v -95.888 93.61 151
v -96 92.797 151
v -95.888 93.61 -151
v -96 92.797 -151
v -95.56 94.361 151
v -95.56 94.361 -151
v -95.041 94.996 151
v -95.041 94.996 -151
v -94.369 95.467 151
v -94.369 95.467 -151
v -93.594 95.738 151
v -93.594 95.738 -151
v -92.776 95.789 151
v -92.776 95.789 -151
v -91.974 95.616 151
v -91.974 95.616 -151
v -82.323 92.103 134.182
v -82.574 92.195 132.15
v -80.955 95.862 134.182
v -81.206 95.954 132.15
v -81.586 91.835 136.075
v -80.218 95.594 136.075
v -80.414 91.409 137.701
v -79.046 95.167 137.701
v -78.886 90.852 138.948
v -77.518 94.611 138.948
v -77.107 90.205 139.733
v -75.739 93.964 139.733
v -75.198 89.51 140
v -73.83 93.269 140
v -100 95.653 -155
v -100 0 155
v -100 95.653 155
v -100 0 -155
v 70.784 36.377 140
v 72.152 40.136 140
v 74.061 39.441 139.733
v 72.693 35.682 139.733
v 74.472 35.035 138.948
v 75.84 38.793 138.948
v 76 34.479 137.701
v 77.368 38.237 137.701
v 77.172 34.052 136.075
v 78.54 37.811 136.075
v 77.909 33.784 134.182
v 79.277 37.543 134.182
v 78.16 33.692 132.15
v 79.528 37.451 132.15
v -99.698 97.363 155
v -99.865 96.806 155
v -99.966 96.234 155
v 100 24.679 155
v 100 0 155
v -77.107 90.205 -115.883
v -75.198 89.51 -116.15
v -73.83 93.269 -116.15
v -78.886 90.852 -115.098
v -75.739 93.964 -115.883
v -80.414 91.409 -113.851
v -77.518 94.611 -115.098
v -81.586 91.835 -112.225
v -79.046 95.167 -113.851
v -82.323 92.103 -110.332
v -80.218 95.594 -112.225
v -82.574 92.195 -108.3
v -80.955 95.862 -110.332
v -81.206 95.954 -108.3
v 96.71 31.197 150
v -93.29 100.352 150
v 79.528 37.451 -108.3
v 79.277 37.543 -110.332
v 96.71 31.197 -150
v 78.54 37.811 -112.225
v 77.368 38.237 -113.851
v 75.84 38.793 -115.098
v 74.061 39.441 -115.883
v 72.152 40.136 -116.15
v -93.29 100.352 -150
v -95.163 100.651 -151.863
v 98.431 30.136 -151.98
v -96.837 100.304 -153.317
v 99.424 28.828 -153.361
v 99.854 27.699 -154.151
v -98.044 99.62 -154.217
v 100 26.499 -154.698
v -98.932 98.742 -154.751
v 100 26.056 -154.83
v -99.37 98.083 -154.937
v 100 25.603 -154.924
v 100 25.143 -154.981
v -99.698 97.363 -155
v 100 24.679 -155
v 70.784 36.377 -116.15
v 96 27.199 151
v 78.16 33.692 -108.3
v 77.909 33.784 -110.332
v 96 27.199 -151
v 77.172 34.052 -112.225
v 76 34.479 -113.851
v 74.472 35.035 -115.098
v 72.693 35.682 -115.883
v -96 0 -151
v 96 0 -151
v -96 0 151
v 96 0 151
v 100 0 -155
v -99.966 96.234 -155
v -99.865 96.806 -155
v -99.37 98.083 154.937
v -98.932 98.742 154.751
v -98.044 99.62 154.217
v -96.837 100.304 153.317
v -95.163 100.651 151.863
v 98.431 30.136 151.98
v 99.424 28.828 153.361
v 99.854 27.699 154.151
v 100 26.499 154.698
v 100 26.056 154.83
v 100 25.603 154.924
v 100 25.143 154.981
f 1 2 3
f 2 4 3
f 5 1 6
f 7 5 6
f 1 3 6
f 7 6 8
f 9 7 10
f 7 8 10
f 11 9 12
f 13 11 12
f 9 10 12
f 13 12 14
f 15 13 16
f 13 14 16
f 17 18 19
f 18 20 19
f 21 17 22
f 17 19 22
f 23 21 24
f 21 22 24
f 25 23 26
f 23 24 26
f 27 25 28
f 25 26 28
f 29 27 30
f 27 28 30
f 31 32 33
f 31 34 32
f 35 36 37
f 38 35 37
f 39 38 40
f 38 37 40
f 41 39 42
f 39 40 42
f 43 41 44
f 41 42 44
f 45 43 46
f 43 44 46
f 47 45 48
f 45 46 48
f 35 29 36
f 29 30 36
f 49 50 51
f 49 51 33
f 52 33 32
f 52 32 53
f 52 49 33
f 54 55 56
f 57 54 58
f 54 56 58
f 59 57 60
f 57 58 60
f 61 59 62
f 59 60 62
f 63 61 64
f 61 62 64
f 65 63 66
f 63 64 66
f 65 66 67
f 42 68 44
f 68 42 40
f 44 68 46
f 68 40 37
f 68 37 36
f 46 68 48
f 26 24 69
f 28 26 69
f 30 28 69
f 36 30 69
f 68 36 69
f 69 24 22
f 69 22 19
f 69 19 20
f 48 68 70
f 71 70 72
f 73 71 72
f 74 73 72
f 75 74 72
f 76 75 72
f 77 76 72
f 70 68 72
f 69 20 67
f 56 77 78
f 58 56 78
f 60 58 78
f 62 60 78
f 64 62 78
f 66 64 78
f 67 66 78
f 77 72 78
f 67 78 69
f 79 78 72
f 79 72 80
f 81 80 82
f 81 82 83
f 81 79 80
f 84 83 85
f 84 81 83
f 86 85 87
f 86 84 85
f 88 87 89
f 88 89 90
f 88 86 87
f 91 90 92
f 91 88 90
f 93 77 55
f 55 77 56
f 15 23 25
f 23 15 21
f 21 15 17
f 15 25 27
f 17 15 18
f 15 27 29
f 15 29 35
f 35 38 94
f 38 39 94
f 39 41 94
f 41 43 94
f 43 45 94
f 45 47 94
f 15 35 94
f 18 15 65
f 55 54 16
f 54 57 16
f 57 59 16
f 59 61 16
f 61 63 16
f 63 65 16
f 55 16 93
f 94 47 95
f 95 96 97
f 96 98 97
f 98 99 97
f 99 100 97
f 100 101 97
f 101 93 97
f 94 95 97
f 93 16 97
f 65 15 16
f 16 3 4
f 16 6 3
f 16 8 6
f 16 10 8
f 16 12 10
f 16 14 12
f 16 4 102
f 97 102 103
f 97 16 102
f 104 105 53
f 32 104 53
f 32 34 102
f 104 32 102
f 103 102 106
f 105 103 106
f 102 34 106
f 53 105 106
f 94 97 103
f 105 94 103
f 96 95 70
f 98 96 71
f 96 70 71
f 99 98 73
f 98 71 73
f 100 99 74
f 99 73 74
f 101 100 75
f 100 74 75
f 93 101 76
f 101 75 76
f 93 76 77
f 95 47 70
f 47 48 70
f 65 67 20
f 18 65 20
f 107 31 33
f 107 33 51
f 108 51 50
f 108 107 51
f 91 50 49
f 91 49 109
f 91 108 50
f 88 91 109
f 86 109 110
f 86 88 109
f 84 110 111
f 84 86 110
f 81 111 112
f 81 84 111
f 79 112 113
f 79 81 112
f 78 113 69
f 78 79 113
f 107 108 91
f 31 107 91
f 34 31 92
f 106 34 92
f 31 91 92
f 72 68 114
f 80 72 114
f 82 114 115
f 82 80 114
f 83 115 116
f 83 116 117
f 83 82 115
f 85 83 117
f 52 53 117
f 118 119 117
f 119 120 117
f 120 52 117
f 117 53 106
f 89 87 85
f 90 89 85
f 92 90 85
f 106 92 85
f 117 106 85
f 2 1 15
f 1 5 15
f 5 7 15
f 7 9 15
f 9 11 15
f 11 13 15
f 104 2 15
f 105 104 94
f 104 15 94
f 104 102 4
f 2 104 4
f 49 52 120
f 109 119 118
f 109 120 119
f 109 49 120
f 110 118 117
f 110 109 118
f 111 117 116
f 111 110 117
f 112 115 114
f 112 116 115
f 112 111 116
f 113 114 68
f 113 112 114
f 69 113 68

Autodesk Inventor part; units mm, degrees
ref_plane "YZ Plane" through (0, 0, 0) normal (1, 0, 0) x (0, 1, 0)
sketch "Sketch1" plane through (0, 0, 0) normal (0, 1, 0) x (-1, 0, 0)
  line L0 (100, 155) -> (-100, 155)
  line L1 (-100, 155) -> (-100, -155)
  line L2 (-100, -155) -> (100, -155)
  line L3 (100, -155) -> (100, 155)
  point P0 (0, 0)
  point P1 (100, 0)
  point P2 (0, -155)
  dimension "d0" = 310
  dimension "d1" = 200
sketch "Sketch2" plane through (0, 0, 0) normal (0, 0, 1) x (1, 0, 0)
  line L0 (-100, 0) -> (100, 0)
  line L1 (100, 0) -> (100, 30)
  line L2 (100, 30) -> (-100, 102.794)
  line L3 (-100, 0) -> (-100, 102.794)
  line L4 (-96, 97.0815) -> (96, 27.1992)
  line L5 (96, 27.1992) -> (96, 0)
  line L6 (-96, 0) -> (-96, 97.0815)
  point P0 (0, 0)
  point P1 (0, 0)
  dimension "d2" = 200
  dimension "d3" = 30
  dimension "d4" = 110
  dimension "d5" = 4
  dimension "d6" = 110
  dimension "d7" = 4
  dimension "d8" = 27.1992
extrude "Extrusion1" add sketch "Sketch2" along normal mid plane 310
extrude "Extrusion2" cut sketch "Sketch2" along normal mid plane 302 contours L6 L4 L5 L0
sketch "Sketch3" plane through (-100, 102.794, 155) normal (0.3420201, 0.9396926, 0) x (0.9396926, -0.3420201, 0)
  line L0 (27.85, 15) -> (183.2, 15)
  line L1 (191.05, 22.85) -> (191.05, 263.3)
  line L2 (183.2, 271.15) -> (27.85, 271.15)
  line L3 (20, 263.3) -> (20, 22.85)
  line L4 (0, 310) -> (0, 0) projected
  line L5 (212.8356, 0) -> (0, 0) projected
  arc A0 (20, 22.85) -> (27.85, 15) centre (27.85, 22.85) ccw
  arc A1 (27.85, 271.15) -> (20, 263.3) centre (27.85, 263.3) ccw
  arc A2 (191.05, 263.3) -> (183.2, 271.15) centre (183.2, 263.3) ccw
  arc A3 (183.2, 15) -> (191.05, 22.85) centre (183.2, 22.85) ccw
  point P0 (129.1269, 155)
  point P1 (191.05, 271.15)
  point P2 (191.05, 15)
  point P3 (20, 271.15)
  dimension "d13" = 171.05
  dimension "d14" = 256.15
  dimension "d15" = 20
  dimension "d16" = 15
  dimension "d17" = 7.85
  dimension "d18" = 7.85
extrude "Extrusion3" cut sketch "Sketch3" against normal up to next
fillet "Fillet1" radius 5 4 edges at (0, 66.397, 155) (0, 66.397, -155) (-100, 102.794, 0) (100, 30, 0)
ref_plane "Work Plane1" through (-10.2594, 70.1311, 132.15) normal (0.9396926, -0.3420201, 0) x (0, 0, -1)
sketch "Sketch4" plane through (-10.2594, 70.1311, 132.15) normal (0.9396926, -0.3420201, 0) x (0, 0, -1)
  point P0 (132.15, -62.3928)
ref_plane "Work Plane2" through (72.1517, 40.136, 4) normal (0, 0, -1) x (-0.9396926, 0.3420201, 0)
sketch "Sketch5" plane through (72.1517, 40.136, 4) normal (0, 0, -1) x (-0.9396926, 0.3420201, 0)
  point P0 (54.0731, -62.3928)
fillet "Fillet2" radius 3 1 edges at (-96, 97.0815, 0)
properties part number "Screen_Support"
